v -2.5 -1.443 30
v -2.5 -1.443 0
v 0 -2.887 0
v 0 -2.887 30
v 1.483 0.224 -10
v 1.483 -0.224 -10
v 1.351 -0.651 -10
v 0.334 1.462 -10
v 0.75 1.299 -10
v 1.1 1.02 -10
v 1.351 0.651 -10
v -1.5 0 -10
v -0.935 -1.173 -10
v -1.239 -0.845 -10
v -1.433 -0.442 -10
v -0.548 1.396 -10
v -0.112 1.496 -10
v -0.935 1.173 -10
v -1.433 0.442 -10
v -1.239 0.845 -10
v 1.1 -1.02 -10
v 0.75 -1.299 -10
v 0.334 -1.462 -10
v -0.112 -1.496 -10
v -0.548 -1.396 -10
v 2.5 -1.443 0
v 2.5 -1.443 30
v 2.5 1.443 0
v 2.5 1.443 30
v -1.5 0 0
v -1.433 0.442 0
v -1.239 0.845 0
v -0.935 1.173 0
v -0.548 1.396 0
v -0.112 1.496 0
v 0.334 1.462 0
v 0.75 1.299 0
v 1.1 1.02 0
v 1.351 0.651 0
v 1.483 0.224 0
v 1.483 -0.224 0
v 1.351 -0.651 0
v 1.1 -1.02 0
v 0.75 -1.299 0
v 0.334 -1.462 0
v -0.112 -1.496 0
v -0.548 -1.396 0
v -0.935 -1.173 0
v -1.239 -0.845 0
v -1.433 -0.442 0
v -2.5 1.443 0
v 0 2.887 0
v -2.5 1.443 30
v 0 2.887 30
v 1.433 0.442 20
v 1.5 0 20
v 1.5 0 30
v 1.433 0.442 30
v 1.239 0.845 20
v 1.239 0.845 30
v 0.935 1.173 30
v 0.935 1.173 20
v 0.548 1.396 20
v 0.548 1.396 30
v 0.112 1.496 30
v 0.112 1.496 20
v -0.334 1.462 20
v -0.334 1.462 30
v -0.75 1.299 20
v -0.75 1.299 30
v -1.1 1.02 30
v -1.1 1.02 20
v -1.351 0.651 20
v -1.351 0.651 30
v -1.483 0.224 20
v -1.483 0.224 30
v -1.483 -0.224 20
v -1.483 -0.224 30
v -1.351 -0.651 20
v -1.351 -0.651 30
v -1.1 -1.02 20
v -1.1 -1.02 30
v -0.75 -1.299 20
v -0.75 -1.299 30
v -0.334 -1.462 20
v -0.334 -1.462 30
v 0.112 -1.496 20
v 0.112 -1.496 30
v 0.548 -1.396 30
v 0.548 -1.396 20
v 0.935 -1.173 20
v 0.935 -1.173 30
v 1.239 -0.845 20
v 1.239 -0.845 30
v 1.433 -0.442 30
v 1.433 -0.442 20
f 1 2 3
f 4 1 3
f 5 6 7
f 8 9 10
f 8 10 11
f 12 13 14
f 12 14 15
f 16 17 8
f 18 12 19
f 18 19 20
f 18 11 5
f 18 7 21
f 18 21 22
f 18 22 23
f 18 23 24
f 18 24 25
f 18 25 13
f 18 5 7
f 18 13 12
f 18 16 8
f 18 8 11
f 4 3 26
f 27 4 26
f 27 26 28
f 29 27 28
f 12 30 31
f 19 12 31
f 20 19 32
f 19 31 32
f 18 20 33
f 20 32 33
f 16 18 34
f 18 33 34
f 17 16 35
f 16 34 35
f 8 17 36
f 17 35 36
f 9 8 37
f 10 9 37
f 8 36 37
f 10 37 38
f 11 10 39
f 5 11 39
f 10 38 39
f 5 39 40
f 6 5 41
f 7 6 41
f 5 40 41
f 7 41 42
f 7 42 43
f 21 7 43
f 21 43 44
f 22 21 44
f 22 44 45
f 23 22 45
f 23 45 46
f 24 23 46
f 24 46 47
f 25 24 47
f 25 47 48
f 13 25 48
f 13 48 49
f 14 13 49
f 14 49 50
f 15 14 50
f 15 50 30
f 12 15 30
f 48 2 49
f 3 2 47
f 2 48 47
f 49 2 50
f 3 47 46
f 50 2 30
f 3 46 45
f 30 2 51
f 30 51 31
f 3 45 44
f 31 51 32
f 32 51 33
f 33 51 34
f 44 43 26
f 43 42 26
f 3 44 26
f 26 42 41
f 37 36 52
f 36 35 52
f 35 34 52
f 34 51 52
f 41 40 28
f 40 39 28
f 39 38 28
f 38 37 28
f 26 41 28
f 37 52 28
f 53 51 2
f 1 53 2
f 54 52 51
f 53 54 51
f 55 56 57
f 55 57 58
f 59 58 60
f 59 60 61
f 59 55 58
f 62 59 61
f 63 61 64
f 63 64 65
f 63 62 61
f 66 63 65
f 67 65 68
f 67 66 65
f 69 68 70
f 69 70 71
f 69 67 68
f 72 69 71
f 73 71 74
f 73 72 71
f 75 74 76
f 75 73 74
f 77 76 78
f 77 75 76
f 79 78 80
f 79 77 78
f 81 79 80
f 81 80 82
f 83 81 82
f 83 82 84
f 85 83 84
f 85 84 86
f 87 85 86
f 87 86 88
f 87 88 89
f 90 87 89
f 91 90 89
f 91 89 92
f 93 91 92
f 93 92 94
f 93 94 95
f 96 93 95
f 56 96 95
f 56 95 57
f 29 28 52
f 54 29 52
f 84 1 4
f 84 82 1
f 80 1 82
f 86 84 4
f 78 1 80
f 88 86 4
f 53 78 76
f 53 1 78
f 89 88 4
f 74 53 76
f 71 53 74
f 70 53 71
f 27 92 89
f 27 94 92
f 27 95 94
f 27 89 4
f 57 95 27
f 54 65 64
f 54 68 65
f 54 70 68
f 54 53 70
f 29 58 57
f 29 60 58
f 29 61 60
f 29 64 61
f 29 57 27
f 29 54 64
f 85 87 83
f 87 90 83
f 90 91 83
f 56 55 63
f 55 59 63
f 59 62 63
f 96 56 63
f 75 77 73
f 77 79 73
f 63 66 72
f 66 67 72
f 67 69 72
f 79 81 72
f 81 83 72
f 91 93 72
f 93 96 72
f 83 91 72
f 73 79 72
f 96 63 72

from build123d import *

# Parameters (mm, degrees)
ESQUISSE1_R             = 1.5
BOSS_EXTRU_2_DEPTH      = 30
ESQUISSE3_R             = 1.5
BOSS_EXTRU_3_DEPTH      = 10
BOSS_EXTRU_3_DEPTH_BACK = 20


with BuildPart() as part:
    # Esquisse1 → Boss.-Extru.2 (new body)
    with BuildSketch(Plane.XY):
        Polygon((0, -2.886751346), (2.5, -1.443375673), (2.5, 1.443375673), (0, 2.886751346), (-2.5, 1.443375673), (-2.5, -1.443375673), align=None)
        Circle(ESQUISSE1_R, mode=Mode.SUBTRACT)
    extrude(amount=BOSS_EXTRU_2_DEPTH)

    # Esquisse3 → Boss.-Extru.3 (add, two sides)
    with BuildSketch(Plane(origin=(0, 0, 0), x_dir=(-1, 0, 0), z_dir=(0, 0, -1))) as boss_extru_3_sk:
        Circle(ESQUISSE3_R)
    extrude(amount=BOSS_EXTRU_3_DEPTH)
    extrude(boss_extru_3_sk.sketch, amount=-BOSS_EXTRU_3_DEPTH_BACK)


solid = part.part
